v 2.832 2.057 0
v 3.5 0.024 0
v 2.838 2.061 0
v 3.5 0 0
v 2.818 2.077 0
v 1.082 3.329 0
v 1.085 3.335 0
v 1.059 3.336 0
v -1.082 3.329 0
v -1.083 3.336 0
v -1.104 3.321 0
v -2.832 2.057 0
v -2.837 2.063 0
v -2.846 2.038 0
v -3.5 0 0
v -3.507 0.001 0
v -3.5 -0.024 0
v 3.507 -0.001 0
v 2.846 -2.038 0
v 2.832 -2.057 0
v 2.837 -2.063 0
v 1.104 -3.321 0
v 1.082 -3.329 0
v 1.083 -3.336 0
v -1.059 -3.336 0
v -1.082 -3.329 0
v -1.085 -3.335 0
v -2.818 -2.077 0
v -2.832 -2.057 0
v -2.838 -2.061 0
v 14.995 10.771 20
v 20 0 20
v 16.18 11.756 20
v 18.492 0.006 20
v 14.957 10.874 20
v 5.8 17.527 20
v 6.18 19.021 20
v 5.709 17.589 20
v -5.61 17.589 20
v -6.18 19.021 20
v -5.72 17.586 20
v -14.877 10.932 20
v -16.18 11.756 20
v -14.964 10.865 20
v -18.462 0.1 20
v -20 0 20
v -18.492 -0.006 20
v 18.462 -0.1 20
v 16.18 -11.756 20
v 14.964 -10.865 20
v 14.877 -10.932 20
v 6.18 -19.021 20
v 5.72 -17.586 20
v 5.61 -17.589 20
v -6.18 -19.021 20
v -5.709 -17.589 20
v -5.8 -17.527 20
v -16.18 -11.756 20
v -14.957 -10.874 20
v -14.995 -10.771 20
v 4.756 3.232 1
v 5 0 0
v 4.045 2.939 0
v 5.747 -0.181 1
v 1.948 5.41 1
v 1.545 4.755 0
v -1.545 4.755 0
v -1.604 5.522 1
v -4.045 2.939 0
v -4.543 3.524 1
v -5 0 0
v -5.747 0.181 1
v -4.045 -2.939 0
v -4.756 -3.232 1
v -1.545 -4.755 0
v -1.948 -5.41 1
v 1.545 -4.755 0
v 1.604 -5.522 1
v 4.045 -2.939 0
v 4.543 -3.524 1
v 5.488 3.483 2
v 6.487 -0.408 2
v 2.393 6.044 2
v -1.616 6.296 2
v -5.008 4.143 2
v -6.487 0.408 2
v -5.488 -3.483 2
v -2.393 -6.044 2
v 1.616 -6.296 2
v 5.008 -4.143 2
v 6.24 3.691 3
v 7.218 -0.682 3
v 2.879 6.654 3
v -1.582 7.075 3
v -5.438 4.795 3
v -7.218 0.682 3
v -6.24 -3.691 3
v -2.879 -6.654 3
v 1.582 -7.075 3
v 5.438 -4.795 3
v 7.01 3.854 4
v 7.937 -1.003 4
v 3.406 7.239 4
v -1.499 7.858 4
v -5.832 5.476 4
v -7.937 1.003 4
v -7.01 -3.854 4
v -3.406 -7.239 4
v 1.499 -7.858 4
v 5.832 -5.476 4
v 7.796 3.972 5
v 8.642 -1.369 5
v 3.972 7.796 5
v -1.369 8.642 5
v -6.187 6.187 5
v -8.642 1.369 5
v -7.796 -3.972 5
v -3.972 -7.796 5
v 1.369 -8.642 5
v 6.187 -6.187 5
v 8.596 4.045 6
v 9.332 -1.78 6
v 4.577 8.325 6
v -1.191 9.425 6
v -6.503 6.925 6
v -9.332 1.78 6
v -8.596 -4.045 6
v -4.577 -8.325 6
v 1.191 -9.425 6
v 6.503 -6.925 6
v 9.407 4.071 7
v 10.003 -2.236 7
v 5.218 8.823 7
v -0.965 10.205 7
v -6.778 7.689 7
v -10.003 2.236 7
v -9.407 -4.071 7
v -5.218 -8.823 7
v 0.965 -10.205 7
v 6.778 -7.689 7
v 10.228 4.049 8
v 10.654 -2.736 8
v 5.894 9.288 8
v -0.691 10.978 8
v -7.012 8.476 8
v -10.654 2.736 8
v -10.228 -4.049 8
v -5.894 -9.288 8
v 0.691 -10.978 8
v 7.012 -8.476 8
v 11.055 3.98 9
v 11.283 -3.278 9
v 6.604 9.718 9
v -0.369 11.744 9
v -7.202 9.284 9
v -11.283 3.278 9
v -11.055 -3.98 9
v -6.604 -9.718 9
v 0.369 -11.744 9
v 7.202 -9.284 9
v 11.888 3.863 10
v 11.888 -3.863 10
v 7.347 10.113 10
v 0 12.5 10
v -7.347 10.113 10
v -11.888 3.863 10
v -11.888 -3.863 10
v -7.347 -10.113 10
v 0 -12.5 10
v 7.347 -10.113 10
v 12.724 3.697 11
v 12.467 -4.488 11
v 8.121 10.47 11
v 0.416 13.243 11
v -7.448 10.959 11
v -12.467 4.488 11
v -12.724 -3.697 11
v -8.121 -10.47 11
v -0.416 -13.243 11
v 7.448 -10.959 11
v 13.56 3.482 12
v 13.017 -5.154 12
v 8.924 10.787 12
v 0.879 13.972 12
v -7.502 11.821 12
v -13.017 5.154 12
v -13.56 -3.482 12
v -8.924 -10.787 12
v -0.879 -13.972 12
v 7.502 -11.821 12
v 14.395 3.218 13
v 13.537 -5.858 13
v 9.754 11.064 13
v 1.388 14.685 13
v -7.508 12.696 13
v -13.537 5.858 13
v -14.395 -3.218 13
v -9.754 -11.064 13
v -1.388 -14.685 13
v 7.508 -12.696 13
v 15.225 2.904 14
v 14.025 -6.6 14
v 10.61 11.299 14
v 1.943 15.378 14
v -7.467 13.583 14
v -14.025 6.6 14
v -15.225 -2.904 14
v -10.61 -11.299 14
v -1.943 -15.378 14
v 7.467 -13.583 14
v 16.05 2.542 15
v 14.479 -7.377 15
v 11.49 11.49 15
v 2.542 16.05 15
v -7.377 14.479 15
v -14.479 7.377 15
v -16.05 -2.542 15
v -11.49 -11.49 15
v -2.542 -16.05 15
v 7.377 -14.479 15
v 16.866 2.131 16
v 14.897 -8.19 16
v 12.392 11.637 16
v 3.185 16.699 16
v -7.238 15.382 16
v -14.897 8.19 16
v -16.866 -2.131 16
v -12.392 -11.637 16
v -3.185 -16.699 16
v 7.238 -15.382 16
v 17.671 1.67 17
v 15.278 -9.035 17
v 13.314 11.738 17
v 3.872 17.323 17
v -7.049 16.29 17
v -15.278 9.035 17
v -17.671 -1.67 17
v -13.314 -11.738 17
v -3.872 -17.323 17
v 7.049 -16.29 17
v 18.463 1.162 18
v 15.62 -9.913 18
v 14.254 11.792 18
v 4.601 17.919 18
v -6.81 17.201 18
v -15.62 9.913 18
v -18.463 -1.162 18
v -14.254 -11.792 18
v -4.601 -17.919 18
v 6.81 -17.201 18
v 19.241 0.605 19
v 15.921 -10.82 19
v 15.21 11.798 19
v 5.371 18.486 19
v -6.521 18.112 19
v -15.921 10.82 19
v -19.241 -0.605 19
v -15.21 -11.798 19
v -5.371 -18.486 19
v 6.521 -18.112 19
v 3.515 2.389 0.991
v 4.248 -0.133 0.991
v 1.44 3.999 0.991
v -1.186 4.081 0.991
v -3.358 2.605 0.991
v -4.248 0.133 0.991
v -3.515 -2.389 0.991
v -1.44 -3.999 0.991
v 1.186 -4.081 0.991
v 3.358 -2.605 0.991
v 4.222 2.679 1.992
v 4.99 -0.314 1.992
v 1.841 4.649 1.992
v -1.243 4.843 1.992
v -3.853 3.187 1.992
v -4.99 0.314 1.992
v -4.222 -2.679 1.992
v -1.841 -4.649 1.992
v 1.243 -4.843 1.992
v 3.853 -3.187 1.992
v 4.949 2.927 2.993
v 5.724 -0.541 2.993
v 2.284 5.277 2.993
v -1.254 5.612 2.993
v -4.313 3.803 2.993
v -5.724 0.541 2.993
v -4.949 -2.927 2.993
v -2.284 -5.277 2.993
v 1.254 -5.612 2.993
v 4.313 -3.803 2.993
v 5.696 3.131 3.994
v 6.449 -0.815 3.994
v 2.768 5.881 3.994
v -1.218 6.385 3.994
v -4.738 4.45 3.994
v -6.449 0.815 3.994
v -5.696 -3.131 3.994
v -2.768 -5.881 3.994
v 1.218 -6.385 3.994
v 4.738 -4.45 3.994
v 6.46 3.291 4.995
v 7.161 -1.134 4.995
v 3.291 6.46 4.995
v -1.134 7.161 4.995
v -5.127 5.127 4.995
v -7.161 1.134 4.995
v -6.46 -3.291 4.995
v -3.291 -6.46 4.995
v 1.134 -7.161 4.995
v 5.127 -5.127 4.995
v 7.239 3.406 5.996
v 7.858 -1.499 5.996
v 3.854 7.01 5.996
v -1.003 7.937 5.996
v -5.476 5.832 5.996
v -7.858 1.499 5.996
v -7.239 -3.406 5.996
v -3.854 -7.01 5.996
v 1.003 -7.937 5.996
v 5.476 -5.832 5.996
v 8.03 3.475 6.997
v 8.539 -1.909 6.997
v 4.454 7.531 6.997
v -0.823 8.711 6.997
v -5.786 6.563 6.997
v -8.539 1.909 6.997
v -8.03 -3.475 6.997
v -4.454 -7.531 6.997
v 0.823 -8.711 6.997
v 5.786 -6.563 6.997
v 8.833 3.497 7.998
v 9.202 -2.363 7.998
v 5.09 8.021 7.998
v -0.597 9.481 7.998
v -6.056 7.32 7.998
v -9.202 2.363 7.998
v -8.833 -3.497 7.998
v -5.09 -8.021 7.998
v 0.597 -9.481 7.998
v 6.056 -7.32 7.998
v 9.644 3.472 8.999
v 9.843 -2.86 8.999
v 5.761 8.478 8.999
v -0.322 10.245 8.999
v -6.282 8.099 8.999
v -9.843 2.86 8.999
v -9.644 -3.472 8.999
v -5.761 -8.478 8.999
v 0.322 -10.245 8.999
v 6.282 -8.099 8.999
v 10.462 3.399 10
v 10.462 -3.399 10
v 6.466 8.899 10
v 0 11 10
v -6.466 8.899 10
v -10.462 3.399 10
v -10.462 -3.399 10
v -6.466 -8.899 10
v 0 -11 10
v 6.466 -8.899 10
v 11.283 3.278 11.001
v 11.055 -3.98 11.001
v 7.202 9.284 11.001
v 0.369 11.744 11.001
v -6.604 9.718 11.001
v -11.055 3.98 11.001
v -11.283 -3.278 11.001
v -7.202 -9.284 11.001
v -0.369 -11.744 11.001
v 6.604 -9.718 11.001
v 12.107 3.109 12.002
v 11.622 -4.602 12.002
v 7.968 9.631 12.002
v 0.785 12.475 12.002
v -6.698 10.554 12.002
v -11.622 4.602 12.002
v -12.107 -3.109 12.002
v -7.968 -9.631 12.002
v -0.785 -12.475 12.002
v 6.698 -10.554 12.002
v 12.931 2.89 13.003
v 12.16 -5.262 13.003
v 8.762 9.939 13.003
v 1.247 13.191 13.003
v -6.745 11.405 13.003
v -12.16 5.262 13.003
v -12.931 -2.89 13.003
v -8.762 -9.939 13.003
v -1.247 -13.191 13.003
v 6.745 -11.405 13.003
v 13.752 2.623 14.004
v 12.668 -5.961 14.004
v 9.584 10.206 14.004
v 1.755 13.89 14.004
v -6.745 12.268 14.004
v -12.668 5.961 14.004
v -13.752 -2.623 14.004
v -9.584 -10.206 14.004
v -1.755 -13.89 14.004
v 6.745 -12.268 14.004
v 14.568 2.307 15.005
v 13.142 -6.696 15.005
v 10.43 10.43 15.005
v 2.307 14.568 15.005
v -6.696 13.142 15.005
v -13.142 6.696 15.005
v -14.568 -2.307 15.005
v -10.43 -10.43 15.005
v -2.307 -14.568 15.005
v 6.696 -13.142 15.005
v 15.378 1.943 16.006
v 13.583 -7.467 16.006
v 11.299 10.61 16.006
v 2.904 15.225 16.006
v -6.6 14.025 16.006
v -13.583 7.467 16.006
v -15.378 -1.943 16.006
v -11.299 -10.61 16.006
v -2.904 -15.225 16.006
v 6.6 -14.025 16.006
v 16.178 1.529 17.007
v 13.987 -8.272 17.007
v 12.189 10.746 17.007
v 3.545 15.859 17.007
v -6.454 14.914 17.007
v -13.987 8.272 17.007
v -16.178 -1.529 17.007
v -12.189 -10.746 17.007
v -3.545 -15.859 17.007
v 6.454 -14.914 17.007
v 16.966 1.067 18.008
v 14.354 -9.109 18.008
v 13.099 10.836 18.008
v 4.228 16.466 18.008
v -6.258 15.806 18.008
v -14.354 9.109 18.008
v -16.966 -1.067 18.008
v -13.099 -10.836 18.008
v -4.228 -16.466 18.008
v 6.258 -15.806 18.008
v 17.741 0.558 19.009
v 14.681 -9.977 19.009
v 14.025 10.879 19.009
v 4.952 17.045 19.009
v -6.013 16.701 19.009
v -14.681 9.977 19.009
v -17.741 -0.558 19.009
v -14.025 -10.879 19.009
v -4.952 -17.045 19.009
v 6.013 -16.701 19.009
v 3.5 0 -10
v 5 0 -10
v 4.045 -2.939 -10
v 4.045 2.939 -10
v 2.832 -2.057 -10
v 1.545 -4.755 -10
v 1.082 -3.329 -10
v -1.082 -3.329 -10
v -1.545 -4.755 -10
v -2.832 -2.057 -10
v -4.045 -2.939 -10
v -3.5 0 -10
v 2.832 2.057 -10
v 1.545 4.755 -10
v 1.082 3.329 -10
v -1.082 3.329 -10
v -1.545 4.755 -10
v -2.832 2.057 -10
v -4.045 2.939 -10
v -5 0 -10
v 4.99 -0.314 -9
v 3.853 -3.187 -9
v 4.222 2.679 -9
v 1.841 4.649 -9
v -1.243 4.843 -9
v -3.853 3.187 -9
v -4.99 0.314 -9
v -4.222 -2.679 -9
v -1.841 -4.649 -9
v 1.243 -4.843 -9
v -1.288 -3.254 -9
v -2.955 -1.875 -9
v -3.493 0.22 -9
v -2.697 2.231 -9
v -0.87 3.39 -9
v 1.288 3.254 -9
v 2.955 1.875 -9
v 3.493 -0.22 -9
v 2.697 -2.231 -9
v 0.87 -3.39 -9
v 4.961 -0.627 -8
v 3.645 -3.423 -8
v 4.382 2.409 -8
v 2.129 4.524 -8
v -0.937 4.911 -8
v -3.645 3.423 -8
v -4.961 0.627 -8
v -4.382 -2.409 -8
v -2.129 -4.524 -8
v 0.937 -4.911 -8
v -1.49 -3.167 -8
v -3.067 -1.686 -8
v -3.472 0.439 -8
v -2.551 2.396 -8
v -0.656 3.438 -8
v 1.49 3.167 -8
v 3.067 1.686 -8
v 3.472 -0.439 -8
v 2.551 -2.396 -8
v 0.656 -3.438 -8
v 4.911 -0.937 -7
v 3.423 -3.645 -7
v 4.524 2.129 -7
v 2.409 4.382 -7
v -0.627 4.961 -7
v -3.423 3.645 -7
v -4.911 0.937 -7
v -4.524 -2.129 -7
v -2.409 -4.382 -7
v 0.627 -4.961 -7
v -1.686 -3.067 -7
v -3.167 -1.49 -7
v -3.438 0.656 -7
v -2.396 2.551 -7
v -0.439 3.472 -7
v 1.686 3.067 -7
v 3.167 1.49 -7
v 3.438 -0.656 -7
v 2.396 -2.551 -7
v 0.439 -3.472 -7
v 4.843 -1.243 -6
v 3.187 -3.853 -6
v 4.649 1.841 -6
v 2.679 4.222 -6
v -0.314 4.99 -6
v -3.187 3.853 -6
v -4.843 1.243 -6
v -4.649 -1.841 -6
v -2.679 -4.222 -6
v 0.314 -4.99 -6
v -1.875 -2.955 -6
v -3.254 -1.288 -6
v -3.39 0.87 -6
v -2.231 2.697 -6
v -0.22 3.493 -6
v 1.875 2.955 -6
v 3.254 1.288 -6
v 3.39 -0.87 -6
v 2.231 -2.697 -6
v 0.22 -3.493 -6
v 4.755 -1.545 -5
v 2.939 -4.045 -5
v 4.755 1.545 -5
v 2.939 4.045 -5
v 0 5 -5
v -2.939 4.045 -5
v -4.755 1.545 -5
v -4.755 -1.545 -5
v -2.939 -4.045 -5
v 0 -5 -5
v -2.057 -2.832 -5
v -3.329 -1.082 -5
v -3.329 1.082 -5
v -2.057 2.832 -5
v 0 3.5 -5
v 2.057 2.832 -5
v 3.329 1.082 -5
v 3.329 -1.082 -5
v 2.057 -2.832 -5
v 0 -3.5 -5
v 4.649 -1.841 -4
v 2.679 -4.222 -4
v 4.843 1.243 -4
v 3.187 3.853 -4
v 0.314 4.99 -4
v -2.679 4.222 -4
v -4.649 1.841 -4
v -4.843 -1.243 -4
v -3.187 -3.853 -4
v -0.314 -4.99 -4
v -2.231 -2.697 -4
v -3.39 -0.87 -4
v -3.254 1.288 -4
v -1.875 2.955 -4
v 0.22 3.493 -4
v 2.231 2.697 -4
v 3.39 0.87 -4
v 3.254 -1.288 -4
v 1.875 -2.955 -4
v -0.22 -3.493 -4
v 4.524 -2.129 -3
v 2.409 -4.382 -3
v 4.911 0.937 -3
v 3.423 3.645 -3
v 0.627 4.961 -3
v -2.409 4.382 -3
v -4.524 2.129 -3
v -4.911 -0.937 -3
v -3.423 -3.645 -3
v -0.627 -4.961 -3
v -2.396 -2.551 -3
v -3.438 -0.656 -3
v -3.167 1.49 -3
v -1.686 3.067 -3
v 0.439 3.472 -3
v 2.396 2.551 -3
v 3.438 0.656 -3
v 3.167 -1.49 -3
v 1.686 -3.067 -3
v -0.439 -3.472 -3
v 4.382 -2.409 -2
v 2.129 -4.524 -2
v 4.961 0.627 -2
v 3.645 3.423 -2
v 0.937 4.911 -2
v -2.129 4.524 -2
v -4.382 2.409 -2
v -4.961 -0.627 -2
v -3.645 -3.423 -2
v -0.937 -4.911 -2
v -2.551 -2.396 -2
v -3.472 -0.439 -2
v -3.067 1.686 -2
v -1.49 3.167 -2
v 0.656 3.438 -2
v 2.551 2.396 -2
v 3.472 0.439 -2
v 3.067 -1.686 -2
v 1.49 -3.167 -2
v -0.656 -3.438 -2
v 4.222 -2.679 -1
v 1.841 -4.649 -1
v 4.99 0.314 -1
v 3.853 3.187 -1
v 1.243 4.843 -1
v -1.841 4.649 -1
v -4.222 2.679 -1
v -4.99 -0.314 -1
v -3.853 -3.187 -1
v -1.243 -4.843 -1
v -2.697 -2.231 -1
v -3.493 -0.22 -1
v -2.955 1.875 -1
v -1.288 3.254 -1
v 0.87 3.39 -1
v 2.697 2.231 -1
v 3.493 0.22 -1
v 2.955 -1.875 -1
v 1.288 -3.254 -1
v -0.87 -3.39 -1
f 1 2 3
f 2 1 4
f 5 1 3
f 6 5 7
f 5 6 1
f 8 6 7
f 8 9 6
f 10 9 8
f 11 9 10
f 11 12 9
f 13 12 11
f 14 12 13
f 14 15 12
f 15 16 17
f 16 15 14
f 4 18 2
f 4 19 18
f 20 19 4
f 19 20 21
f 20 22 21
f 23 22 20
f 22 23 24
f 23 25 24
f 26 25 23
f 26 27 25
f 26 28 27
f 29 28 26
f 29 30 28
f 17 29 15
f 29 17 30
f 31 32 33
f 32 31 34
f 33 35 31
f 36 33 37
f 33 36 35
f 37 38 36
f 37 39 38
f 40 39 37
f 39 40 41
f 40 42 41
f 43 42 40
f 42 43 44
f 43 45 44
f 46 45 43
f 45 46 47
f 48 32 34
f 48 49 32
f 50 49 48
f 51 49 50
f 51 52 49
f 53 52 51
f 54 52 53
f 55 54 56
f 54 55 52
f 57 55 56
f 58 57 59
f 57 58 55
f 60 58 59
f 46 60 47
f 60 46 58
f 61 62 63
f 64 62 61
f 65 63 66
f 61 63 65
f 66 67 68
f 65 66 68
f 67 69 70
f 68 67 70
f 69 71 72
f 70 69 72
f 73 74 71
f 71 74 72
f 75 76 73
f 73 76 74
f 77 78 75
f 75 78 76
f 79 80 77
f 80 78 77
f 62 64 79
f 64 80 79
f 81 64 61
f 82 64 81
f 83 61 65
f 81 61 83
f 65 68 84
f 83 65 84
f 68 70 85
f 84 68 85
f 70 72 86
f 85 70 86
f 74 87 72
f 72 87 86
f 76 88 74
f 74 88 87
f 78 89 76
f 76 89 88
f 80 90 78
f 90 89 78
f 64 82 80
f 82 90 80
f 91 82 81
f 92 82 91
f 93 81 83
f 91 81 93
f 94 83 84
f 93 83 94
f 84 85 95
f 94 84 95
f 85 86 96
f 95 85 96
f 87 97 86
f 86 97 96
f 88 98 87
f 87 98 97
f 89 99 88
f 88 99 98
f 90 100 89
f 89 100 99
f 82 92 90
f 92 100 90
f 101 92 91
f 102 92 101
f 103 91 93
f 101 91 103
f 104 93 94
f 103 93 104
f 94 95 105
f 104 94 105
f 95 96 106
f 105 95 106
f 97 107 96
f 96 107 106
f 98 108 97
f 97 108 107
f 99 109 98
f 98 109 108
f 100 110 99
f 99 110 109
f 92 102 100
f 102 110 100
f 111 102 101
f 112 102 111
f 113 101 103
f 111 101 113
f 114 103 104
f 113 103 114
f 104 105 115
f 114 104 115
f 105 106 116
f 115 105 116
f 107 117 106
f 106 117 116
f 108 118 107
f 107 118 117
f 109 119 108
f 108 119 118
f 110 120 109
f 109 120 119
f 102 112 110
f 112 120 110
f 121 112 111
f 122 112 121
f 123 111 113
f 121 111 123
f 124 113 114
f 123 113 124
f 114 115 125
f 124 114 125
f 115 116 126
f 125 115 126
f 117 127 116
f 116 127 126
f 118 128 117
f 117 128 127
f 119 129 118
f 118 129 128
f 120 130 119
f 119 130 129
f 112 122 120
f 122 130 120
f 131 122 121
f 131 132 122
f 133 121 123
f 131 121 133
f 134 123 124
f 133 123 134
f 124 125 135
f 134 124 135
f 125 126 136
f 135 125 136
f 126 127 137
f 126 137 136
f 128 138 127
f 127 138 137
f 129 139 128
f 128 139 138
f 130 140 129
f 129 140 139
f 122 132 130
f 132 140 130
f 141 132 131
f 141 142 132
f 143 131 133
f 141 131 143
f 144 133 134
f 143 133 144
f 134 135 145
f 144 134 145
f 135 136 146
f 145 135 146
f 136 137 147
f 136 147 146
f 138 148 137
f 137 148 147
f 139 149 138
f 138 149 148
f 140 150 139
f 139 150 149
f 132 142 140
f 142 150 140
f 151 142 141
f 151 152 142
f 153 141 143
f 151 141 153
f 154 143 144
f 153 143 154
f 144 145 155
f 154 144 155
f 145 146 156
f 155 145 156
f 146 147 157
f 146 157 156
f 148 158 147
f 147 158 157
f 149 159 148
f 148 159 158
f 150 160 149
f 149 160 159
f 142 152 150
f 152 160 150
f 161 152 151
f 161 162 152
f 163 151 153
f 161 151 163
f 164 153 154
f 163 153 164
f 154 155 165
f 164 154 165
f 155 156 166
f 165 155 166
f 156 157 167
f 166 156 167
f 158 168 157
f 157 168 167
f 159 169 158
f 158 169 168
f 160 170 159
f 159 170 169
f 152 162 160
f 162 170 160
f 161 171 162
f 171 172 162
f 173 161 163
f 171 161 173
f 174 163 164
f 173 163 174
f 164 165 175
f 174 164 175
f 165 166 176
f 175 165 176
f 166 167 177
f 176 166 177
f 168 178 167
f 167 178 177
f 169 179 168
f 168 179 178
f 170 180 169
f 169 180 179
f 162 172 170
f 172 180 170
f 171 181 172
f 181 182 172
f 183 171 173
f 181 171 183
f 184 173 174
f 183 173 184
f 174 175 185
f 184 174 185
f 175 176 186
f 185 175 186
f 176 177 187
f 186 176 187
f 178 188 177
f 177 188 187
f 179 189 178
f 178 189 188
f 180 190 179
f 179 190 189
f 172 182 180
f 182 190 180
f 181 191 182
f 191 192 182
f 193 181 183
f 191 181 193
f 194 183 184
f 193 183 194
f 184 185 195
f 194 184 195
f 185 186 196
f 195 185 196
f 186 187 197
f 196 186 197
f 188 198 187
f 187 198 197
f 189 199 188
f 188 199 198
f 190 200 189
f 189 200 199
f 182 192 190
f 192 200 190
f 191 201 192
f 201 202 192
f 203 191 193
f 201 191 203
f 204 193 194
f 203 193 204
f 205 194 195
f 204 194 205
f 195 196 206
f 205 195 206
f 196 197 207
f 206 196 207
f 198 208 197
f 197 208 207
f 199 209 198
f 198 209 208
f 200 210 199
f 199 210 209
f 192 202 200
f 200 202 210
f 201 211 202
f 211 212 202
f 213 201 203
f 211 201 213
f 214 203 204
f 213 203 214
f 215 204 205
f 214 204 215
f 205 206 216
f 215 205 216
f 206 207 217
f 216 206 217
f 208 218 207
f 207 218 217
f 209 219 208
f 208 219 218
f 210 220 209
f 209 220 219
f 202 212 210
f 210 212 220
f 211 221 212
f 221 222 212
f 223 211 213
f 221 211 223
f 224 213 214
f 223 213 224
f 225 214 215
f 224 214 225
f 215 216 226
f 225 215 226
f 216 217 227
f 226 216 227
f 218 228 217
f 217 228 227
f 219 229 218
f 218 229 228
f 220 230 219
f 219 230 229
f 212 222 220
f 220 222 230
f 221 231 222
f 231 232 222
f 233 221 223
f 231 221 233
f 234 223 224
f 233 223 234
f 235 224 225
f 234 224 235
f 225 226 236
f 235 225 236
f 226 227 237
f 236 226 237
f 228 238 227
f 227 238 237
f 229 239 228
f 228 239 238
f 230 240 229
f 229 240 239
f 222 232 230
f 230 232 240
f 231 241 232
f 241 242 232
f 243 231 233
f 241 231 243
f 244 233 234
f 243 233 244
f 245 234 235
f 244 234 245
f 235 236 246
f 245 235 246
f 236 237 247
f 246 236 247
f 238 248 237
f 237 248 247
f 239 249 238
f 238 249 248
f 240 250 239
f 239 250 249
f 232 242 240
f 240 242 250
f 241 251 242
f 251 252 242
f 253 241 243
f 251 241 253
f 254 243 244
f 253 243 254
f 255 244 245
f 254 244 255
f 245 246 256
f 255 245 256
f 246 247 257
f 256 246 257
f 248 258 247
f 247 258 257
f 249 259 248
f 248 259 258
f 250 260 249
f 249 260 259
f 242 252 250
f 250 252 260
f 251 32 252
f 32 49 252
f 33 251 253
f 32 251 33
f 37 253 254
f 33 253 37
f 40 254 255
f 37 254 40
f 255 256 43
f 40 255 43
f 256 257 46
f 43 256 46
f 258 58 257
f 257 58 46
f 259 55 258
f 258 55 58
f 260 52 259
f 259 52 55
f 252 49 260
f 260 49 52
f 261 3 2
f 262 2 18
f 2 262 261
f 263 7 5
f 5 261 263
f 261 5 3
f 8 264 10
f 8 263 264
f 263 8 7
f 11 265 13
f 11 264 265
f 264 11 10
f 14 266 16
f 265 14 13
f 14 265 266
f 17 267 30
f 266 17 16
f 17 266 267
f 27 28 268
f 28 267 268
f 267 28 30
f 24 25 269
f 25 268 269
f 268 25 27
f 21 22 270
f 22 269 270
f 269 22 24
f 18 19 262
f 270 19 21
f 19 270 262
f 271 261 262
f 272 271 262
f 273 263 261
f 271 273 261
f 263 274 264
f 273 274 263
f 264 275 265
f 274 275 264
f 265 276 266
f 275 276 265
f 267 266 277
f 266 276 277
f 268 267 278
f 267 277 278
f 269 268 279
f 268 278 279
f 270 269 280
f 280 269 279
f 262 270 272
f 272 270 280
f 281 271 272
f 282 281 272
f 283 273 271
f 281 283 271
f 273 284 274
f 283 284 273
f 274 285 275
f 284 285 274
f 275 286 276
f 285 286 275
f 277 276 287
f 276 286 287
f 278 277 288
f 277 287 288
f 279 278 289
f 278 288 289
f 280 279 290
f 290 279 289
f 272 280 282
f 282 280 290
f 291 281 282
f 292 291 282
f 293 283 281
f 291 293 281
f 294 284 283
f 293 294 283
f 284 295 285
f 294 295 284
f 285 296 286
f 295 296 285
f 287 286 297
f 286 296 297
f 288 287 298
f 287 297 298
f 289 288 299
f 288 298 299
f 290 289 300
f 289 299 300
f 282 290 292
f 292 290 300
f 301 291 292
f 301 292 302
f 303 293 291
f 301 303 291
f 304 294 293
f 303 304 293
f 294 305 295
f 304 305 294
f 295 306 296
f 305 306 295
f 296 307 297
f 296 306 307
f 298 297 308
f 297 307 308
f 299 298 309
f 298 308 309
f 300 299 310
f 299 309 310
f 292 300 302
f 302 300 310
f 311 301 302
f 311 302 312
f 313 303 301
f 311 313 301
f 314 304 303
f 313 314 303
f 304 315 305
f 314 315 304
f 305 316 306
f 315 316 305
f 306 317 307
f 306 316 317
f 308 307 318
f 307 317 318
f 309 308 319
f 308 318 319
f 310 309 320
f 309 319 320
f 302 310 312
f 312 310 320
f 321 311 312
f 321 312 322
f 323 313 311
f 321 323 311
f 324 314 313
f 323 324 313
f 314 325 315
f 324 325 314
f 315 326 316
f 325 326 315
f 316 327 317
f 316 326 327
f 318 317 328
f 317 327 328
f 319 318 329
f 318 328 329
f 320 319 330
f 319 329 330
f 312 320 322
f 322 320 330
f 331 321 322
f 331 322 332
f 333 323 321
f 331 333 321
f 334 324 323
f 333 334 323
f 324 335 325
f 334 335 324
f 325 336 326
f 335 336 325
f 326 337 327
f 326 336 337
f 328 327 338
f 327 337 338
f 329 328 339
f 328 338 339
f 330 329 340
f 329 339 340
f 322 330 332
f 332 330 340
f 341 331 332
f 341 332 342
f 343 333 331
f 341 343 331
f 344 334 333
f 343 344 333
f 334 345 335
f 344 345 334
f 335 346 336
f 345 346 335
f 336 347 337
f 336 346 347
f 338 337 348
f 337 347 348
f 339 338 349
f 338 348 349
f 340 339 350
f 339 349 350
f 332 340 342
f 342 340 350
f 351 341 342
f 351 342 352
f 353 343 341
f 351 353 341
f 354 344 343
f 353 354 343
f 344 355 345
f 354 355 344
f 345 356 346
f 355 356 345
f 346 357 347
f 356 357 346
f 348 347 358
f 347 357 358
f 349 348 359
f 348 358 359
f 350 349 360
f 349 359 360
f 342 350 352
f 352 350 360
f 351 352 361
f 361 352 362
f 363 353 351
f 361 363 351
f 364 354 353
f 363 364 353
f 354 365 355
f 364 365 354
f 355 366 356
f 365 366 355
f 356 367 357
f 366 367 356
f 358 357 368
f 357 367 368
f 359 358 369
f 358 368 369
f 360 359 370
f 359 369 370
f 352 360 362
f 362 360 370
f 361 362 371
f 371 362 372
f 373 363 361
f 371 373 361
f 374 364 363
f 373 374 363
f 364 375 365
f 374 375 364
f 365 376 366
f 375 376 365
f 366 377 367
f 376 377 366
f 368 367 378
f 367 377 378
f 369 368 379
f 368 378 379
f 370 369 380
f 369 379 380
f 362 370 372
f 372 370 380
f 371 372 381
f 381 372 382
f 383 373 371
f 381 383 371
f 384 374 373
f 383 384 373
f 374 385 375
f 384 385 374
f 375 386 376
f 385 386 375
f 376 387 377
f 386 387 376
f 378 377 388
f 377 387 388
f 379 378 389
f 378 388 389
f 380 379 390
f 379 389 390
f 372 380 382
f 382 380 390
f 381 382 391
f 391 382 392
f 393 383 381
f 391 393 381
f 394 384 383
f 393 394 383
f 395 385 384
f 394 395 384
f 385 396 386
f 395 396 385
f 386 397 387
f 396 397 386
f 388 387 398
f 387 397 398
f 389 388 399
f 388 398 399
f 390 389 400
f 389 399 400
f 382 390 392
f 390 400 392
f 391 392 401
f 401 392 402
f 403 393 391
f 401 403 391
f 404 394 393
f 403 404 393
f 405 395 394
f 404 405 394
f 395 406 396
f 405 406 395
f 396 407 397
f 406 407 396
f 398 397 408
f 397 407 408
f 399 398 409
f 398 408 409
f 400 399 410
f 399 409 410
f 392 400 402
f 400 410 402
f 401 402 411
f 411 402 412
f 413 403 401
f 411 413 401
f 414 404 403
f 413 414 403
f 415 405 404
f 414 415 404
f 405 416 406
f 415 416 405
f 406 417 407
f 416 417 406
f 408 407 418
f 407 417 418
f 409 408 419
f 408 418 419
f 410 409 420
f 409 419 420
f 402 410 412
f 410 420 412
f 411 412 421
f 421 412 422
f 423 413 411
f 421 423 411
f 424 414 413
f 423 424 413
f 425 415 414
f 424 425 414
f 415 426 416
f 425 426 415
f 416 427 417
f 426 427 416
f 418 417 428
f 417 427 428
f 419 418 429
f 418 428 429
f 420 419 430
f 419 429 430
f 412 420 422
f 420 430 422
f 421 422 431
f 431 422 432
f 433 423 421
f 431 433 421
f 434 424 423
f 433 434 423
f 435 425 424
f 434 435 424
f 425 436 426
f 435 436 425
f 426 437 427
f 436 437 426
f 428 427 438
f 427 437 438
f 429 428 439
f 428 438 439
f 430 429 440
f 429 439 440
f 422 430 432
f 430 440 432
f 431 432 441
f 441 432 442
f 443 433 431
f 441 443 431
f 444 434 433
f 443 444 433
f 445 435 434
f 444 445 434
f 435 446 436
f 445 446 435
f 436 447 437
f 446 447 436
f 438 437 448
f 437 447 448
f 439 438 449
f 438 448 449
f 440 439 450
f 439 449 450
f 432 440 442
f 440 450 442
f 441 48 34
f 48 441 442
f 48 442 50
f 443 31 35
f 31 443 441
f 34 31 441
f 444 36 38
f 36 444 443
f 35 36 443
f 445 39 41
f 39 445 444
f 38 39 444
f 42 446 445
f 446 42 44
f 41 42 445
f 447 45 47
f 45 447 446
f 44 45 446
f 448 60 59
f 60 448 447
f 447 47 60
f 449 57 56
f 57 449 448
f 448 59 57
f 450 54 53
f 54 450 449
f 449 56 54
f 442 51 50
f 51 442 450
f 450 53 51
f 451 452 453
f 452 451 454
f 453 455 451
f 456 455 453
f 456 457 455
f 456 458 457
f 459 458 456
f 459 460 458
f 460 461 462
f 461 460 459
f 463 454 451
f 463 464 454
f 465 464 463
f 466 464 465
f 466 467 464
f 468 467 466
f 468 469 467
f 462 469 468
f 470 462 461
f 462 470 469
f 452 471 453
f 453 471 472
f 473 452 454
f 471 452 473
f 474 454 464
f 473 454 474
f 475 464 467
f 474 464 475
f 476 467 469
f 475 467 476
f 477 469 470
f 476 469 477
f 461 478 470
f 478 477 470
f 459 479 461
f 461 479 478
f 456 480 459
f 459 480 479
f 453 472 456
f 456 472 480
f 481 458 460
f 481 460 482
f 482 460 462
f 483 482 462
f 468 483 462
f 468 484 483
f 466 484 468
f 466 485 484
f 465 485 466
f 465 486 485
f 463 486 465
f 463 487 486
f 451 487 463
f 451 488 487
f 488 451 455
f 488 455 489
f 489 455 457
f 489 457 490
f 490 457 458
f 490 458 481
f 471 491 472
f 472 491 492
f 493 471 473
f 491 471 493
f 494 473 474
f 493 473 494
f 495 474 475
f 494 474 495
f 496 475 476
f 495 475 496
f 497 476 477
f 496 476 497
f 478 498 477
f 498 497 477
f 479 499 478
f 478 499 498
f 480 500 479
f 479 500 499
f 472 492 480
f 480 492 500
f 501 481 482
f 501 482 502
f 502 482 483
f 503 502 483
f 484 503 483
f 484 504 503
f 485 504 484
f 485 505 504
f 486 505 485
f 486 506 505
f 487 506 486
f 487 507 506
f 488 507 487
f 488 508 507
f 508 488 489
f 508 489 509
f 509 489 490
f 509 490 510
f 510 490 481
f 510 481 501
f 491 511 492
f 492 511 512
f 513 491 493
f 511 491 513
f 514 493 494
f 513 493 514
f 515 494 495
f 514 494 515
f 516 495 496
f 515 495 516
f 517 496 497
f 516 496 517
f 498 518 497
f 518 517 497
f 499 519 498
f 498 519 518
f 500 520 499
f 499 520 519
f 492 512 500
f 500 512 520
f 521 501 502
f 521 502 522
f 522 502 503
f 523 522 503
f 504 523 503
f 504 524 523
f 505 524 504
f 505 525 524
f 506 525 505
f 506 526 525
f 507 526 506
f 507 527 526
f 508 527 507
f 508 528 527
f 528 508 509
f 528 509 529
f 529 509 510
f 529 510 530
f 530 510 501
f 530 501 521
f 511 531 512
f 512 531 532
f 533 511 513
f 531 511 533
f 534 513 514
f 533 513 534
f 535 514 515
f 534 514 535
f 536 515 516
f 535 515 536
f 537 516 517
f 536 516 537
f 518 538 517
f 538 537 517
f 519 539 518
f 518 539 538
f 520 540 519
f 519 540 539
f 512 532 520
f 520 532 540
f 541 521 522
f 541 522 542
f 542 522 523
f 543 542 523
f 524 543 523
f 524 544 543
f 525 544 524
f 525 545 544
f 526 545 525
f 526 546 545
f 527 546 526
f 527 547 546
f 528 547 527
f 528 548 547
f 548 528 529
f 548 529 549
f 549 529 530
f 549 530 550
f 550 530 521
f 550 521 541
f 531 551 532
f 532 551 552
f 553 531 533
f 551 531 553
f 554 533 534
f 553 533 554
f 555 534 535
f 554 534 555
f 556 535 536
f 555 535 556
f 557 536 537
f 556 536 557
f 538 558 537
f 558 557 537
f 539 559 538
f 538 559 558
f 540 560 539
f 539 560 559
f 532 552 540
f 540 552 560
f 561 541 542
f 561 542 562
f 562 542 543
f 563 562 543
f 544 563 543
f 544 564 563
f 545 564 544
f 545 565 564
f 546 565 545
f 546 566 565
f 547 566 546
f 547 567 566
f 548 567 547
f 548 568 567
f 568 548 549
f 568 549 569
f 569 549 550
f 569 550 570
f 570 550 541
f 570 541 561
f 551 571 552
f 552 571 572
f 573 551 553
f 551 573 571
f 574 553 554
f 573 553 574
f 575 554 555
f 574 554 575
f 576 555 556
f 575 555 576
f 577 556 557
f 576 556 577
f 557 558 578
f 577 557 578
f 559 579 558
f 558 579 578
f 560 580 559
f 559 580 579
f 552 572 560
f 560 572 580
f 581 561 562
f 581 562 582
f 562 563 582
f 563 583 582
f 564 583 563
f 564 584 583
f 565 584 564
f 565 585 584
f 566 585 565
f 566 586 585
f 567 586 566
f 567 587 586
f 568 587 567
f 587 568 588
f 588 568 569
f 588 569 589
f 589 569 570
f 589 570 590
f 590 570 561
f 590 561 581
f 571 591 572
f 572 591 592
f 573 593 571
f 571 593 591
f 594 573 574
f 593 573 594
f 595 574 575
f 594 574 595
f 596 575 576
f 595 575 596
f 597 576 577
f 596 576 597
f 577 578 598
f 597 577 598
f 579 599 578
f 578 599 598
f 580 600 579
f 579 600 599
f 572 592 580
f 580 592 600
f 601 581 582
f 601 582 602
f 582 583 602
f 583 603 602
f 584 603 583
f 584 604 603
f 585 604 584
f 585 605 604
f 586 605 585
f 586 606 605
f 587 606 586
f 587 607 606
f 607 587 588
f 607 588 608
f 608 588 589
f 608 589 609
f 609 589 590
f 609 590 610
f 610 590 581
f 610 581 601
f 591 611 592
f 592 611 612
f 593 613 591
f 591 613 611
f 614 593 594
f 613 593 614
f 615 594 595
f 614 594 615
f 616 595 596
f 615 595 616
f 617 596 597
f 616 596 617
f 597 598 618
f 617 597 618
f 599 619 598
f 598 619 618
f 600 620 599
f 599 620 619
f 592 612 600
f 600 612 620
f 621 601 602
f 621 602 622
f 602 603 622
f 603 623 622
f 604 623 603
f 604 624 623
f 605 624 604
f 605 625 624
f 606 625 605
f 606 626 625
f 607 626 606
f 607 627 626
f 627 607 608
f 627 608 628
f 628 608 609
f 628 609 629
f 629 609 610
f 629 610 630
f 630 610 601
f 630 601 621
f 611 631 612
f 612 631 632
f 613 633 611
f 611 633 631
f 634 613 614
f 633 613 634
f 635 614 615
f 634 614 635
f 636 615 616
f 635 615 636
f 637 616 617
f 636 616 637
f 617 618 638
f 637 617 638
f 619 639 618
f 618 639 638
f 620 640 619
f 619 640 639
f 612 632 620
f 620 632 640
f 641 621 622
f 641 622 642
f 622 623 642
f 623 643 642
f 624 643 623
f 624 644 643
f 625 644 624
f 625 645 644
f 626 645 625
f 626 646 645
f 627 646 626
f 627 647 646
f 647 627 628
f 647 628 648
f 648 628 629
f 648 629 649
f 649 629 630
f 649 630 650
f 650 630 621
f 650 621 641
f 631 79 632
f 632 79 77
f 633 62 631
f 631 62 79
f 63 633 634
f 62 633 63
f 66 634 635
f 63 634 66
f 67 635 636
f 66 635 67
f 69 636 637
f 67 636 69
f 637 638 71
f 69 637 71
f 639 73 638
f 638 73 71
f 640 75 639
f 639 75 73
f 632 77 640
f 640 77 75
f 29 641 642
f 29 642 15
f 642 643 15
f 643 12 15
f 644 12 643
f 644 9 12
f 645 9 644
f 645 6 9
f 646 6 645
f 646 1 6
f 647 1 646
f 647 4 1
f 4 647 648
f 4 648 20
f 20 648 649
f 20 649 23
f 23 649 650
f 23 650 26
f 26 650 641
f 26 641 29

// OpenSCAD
wall=1.5;

dia=10;
h1=10;
h2=20;
scl=4;

e=0.01;

$fn=10;

difference() {
    linear_extrude(height=h2, scale=[scl,scl], slices=h2, twist=36)
    circle(d=dia);
    
    scl2=(dia*scl - 2 * wall) / (dia - 2 * wall);
    
    translate([0,0,-e])
    linear_extrude(height=h2+2*e, scale=[scl2,scl2], slices=h2, twist=36)
    circle(d=dia-2*wall);
}

translate([0,0,-h1])
linear_extrude(height=h1, twist=36, slices=h1)
difference() {
    circle(d=dia);
    circle(d=dia-2*wall);
}
